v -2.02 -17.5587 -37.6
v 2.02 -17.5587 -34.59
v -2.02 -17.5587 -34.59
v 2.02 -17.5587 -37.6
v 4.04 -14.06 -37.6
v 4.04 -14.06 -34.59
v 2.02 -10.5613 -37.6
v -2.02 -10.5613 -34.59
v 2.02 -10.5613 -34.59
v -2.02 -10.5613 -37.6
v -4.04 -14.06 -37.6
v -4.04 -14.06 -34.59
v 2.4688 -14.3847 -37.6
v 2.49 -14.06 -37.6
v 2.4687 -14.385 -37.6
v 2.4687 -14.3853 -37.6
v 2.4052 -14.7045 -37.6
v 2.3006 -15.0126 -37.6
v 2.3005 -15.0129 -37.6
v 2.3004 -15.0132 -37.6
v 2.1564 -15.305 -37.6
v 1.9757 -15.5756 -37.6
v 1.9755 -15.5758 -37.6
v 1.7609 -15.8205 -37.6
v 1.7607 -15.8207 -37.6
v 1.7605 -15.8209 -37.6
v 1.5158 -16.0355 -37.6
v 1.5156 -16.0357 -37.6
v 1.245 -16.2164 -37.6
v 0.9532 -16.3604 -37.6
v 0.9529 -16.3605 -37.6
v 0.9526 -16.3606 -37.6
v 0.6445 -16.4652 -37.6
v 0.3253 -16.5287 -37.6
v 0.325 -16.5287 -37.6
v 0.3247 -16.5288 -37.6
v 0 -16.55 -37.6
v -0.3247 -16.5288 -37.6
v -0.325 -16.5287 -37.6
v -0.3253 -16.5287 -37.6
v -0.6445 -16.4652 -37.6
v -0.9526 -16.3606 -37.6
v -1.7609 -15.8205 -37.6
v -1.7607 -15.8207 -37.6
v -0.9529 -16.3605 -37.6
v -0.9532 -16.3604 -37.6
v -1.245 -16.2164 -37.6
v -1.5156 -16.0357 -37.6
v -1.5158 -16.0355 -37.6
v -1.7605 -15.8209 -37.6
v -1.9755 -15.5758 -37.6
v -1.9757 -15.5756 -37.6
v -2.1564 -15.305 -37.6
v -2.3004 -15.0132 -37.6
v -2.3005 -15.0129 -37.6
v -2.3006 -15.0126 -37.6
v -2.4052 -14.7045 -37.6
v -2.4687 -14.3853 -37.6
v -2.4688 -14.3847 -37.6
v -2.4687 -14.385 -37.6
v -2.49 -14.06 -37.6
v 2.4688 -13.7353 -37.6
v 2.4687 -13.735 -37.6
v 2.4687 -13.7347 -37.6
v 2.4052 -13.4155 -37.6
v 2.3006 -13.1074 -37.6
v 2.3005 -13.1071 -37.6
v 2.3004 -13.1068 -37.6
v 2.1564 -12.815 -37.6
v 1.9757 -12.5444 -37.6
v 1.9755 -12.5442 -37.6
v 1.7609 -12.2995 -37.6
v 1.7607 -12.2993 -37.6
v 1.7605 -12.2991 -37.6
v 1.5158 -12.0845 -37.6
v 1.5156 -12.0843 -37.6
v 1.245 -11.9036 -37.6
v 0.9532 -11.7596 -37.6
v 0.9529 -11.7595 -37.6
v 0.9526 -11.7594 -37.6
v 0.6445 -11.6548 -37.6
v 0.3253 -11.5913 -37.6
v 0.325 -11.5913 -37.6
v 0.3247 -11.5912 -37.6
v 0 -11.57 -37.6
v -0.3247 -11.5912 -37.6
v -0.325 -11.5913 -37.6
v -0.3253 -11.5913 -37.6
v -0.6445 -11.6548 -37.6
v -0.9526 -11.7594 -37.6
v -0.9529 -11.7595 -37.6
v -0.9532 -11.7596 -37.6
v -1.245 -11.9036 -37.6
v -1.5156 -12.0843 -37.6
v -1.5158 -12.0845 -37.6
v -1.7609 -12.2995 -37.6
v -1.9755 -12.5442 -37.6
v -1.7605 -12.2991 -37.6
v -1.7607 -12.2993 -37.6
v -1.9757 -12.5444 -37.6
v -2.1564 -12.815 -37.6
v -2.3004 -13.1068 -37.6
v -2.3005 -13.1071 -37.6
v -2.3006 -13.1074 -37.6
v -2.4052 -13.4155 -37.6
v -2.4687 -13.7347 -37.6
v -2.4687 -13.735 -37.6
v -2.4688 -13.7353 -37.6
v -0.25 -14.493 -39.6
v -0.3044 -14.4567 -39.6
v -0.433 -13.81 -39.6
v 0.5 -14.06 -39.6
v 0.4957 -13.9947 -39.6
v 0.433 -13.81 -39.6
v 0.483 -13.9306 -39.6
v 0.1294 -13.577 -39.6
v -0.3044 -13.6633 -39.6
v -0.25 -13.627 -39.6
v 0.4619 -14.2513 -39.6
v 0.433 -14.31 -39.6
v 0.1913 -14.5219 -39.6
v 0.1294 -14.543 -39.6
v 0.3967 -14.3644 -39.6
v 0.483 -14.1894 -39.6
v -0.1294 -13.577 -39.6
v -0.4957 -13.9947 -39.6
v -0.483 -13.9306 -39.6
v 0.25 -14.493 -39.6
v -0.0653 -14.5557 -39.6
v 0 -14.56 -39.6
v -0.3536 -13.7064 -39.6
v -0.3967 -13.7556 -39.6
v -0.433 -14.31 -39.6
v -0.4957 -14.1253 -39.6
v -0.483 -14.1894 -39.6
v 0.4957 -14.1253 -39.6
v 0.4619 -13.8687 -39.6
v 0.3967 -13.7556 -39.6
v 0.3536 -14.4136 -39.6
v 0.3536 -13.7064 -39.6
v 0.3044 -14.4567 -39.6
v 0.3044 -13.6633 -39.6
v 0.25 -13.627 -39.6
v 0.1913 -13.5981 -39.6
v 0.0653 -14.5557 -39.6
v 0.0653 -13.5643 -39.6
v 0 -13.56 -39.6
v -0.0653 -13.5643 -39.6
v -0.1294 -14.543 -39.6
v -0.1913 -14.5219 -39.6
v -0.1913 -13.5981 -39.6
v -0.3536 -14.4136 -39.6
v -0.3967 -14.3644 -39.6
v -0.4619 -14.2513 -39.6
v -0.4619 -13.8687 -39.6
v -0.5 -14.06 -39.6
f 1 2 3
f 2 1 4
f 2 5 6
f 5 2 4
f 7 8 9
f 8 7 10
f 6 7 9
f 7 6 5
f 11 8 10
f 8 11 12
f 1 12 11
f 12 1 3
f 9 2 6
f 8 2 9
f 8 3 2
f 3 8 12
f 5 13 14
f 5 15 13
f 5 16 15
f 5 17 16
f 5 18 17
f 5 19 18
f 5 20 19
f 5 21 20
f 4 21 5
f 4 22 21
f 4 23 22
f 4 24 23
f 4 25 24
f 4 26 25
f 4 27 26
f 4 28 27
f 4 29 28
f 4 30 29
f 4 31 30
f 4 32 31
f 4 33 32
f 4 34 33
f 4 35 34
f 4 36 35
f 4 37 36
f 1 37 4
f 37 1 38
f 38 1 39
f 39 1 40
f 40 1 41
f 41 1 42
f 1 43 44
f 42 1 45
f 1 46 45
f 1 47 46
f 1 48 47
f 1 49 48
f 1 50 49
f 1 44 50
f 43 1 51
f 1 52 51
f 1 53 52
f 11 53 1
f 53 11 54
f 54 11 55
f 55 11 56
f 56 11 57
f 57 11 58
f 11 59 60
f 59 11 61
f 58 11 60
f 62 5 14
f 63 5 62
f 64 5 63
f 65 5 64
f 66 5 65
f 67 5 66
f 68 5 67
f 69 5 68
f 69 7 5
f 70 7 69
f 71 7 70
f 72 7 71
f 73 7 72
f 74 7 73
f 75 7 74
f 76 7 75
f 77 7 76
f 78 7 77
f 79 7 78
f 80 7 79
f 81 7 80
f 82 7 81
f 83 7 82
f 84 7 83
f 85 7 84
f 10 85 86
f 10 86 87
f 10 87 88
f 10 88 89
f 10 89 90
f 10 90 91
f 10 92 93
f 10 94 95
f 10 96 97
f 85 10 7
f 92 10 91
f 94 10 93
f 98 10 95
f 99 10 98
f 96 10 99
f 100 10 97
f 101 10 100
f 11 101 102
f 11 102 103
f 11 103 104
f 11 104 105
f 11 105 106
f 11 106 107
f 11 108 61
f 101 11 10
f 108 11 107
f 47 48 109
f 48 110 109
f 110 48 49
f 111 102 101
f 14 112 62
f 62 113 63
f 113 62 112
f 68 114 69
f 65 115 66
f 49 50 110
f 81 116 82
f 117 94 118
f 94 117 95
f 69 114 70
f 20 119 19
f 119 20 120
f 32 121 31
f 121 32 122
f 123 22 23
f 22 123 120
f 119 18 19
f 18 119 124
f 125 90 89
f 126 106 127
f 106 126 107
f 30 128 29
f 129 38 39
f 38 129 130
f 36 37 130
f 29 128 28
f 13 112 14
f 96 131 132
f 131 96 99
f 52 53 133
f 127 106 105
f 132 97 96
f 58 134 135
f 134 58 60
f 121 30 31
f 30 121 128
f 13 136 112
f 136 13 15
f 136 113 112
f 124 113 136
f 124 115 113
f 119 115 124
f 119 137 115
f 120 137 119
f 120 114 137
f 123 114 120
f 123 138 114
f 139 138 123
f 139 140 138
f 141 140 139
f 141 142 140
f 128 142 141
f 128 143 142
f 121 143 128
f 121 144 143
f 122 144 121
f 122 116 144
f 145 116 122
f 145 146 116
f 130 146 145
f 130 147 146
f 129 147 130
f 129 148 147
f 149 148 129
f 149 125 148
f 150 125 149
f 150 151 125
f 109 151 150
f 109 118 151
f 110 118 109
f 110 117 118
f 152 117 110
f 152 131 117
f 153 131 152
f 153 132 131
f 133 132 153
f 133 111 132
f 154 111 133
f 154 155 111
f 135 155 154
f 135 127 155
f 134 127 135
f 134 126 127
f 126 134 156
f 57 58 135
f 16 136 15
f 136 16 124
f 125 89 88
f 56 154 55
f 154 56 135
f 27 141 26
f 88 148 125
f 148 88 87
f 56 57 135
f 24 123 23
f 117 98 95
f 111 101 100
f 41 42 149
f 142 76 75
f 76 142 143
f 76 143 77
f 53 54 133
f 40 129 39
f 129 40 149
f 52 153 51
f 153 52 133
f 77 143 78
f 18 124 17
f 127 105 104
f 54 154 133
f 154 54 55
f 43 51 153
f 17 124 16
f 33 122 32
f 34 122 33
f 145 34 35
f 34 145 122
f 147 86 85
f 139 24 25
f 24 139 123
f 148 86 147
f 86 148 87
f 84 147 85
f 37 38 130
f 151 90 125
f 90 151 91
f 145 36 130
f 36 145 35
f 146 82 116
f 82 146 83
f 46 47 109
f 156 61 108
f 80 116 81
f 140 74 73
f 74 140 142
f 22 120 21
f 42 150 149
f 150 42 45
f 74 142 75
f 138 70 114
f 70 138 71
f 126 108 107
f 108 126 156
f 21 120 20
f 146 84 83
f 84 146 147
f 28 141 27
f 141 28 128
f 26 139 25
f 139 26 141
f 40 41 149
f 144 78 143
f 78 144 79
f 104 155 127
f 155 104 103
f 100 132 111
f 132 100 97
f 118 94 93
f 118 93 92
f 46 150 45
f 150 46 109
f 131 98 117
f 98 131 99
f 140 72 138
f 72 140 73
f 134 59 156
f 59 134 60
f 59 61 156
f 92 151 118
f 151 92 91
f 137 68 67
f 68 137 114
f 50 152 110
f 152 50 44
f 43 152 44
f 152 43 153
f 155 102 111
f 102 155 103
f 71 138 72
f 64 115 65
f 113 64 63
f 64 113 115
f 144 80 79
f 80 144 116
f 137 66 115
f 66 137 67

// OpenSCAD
// file: lib/v6.scad
// Simplified E3D V6, placed according to the Igneus body's hotend seat.
// The nozzle tip ends up ~2 mm below the ducts (adjustable with the height slot).
$fn = 48;
v6_axis = [0, -14.06];
v6_top = 21.7;                       // top of the groove mount
v6_hs_bottom = v6_top - 42.7;        // bottom of the heatsink
v6_block_top = v6_hs_bottom - 2.1;   // top of the heater block

module v6_heatsink() translate([v6_axis[0], v6_axis[1], 0]) {
    translate([0, 0, v6_top - 3.7]) cylinder(d = 16, h = 3.7);
    translate([0, 0, v6_top - 9.7]) cylinder(d = 12, h = 6 + 0.01);
    translate([0, 0, v6_top - 12.7]) cylinder(d = 16, h = 3 + 0.01);
    translate([0, 0, v6_hs_bottom]) cylinder(d = 10, h = 30 + 0.01);
    for (i = [0 : 10]) translate([0, 0, v6_top - 12.7 - 2.2 - i * 2.55]) cylinder(d = 22.3, h = 1.1);
    translate([0, 0, v6_hs_bottom]) cylinder(d = 16, h = 1.2);
    translate([0, 0, v6_block_top - 0.01]) cylinder(d = 7, h = 2.2);   // heatbreak
}
module v6_heater_block() translate([v6_axis[0], v6_axis[1], 0])
    translate([-8, -8, v6_block_top - 11.5]) cube([16, 20, 11.5]);
module v6_heater_cartridge() translate([v6_axis[0], v6_axis[1], 0]) {
    translate([-10, 7, v6_block_top - 5.75]) rotate([0, 90, 0]) cylinder(d = 6, h = 20);
    translate([8, -4.5, v6_block_top - 8]) rotate([0, 90, 0]) cylinder(d = 3, h = 2);   // thermistor
}
module v6_nozzle() translate([v6_axis[0], v6_axis[1], 0]) {
    translate([0, 0, v6_block_top - 11.5 - 3]) cylinder(d = 8.08, h = 3 + 0.01, $fn = 6);
    translate([0, 0, v6_block_top - 11.5 - 5]) cylinder(d1 = 1, d2 = 5, h = 2 + 0.01);
}
// main file
// color: #d6ab4a
// material: metal
// PREVIEW ONLY: brass nozzle.
include <lib/v6.scad>
v6_nozzle();
